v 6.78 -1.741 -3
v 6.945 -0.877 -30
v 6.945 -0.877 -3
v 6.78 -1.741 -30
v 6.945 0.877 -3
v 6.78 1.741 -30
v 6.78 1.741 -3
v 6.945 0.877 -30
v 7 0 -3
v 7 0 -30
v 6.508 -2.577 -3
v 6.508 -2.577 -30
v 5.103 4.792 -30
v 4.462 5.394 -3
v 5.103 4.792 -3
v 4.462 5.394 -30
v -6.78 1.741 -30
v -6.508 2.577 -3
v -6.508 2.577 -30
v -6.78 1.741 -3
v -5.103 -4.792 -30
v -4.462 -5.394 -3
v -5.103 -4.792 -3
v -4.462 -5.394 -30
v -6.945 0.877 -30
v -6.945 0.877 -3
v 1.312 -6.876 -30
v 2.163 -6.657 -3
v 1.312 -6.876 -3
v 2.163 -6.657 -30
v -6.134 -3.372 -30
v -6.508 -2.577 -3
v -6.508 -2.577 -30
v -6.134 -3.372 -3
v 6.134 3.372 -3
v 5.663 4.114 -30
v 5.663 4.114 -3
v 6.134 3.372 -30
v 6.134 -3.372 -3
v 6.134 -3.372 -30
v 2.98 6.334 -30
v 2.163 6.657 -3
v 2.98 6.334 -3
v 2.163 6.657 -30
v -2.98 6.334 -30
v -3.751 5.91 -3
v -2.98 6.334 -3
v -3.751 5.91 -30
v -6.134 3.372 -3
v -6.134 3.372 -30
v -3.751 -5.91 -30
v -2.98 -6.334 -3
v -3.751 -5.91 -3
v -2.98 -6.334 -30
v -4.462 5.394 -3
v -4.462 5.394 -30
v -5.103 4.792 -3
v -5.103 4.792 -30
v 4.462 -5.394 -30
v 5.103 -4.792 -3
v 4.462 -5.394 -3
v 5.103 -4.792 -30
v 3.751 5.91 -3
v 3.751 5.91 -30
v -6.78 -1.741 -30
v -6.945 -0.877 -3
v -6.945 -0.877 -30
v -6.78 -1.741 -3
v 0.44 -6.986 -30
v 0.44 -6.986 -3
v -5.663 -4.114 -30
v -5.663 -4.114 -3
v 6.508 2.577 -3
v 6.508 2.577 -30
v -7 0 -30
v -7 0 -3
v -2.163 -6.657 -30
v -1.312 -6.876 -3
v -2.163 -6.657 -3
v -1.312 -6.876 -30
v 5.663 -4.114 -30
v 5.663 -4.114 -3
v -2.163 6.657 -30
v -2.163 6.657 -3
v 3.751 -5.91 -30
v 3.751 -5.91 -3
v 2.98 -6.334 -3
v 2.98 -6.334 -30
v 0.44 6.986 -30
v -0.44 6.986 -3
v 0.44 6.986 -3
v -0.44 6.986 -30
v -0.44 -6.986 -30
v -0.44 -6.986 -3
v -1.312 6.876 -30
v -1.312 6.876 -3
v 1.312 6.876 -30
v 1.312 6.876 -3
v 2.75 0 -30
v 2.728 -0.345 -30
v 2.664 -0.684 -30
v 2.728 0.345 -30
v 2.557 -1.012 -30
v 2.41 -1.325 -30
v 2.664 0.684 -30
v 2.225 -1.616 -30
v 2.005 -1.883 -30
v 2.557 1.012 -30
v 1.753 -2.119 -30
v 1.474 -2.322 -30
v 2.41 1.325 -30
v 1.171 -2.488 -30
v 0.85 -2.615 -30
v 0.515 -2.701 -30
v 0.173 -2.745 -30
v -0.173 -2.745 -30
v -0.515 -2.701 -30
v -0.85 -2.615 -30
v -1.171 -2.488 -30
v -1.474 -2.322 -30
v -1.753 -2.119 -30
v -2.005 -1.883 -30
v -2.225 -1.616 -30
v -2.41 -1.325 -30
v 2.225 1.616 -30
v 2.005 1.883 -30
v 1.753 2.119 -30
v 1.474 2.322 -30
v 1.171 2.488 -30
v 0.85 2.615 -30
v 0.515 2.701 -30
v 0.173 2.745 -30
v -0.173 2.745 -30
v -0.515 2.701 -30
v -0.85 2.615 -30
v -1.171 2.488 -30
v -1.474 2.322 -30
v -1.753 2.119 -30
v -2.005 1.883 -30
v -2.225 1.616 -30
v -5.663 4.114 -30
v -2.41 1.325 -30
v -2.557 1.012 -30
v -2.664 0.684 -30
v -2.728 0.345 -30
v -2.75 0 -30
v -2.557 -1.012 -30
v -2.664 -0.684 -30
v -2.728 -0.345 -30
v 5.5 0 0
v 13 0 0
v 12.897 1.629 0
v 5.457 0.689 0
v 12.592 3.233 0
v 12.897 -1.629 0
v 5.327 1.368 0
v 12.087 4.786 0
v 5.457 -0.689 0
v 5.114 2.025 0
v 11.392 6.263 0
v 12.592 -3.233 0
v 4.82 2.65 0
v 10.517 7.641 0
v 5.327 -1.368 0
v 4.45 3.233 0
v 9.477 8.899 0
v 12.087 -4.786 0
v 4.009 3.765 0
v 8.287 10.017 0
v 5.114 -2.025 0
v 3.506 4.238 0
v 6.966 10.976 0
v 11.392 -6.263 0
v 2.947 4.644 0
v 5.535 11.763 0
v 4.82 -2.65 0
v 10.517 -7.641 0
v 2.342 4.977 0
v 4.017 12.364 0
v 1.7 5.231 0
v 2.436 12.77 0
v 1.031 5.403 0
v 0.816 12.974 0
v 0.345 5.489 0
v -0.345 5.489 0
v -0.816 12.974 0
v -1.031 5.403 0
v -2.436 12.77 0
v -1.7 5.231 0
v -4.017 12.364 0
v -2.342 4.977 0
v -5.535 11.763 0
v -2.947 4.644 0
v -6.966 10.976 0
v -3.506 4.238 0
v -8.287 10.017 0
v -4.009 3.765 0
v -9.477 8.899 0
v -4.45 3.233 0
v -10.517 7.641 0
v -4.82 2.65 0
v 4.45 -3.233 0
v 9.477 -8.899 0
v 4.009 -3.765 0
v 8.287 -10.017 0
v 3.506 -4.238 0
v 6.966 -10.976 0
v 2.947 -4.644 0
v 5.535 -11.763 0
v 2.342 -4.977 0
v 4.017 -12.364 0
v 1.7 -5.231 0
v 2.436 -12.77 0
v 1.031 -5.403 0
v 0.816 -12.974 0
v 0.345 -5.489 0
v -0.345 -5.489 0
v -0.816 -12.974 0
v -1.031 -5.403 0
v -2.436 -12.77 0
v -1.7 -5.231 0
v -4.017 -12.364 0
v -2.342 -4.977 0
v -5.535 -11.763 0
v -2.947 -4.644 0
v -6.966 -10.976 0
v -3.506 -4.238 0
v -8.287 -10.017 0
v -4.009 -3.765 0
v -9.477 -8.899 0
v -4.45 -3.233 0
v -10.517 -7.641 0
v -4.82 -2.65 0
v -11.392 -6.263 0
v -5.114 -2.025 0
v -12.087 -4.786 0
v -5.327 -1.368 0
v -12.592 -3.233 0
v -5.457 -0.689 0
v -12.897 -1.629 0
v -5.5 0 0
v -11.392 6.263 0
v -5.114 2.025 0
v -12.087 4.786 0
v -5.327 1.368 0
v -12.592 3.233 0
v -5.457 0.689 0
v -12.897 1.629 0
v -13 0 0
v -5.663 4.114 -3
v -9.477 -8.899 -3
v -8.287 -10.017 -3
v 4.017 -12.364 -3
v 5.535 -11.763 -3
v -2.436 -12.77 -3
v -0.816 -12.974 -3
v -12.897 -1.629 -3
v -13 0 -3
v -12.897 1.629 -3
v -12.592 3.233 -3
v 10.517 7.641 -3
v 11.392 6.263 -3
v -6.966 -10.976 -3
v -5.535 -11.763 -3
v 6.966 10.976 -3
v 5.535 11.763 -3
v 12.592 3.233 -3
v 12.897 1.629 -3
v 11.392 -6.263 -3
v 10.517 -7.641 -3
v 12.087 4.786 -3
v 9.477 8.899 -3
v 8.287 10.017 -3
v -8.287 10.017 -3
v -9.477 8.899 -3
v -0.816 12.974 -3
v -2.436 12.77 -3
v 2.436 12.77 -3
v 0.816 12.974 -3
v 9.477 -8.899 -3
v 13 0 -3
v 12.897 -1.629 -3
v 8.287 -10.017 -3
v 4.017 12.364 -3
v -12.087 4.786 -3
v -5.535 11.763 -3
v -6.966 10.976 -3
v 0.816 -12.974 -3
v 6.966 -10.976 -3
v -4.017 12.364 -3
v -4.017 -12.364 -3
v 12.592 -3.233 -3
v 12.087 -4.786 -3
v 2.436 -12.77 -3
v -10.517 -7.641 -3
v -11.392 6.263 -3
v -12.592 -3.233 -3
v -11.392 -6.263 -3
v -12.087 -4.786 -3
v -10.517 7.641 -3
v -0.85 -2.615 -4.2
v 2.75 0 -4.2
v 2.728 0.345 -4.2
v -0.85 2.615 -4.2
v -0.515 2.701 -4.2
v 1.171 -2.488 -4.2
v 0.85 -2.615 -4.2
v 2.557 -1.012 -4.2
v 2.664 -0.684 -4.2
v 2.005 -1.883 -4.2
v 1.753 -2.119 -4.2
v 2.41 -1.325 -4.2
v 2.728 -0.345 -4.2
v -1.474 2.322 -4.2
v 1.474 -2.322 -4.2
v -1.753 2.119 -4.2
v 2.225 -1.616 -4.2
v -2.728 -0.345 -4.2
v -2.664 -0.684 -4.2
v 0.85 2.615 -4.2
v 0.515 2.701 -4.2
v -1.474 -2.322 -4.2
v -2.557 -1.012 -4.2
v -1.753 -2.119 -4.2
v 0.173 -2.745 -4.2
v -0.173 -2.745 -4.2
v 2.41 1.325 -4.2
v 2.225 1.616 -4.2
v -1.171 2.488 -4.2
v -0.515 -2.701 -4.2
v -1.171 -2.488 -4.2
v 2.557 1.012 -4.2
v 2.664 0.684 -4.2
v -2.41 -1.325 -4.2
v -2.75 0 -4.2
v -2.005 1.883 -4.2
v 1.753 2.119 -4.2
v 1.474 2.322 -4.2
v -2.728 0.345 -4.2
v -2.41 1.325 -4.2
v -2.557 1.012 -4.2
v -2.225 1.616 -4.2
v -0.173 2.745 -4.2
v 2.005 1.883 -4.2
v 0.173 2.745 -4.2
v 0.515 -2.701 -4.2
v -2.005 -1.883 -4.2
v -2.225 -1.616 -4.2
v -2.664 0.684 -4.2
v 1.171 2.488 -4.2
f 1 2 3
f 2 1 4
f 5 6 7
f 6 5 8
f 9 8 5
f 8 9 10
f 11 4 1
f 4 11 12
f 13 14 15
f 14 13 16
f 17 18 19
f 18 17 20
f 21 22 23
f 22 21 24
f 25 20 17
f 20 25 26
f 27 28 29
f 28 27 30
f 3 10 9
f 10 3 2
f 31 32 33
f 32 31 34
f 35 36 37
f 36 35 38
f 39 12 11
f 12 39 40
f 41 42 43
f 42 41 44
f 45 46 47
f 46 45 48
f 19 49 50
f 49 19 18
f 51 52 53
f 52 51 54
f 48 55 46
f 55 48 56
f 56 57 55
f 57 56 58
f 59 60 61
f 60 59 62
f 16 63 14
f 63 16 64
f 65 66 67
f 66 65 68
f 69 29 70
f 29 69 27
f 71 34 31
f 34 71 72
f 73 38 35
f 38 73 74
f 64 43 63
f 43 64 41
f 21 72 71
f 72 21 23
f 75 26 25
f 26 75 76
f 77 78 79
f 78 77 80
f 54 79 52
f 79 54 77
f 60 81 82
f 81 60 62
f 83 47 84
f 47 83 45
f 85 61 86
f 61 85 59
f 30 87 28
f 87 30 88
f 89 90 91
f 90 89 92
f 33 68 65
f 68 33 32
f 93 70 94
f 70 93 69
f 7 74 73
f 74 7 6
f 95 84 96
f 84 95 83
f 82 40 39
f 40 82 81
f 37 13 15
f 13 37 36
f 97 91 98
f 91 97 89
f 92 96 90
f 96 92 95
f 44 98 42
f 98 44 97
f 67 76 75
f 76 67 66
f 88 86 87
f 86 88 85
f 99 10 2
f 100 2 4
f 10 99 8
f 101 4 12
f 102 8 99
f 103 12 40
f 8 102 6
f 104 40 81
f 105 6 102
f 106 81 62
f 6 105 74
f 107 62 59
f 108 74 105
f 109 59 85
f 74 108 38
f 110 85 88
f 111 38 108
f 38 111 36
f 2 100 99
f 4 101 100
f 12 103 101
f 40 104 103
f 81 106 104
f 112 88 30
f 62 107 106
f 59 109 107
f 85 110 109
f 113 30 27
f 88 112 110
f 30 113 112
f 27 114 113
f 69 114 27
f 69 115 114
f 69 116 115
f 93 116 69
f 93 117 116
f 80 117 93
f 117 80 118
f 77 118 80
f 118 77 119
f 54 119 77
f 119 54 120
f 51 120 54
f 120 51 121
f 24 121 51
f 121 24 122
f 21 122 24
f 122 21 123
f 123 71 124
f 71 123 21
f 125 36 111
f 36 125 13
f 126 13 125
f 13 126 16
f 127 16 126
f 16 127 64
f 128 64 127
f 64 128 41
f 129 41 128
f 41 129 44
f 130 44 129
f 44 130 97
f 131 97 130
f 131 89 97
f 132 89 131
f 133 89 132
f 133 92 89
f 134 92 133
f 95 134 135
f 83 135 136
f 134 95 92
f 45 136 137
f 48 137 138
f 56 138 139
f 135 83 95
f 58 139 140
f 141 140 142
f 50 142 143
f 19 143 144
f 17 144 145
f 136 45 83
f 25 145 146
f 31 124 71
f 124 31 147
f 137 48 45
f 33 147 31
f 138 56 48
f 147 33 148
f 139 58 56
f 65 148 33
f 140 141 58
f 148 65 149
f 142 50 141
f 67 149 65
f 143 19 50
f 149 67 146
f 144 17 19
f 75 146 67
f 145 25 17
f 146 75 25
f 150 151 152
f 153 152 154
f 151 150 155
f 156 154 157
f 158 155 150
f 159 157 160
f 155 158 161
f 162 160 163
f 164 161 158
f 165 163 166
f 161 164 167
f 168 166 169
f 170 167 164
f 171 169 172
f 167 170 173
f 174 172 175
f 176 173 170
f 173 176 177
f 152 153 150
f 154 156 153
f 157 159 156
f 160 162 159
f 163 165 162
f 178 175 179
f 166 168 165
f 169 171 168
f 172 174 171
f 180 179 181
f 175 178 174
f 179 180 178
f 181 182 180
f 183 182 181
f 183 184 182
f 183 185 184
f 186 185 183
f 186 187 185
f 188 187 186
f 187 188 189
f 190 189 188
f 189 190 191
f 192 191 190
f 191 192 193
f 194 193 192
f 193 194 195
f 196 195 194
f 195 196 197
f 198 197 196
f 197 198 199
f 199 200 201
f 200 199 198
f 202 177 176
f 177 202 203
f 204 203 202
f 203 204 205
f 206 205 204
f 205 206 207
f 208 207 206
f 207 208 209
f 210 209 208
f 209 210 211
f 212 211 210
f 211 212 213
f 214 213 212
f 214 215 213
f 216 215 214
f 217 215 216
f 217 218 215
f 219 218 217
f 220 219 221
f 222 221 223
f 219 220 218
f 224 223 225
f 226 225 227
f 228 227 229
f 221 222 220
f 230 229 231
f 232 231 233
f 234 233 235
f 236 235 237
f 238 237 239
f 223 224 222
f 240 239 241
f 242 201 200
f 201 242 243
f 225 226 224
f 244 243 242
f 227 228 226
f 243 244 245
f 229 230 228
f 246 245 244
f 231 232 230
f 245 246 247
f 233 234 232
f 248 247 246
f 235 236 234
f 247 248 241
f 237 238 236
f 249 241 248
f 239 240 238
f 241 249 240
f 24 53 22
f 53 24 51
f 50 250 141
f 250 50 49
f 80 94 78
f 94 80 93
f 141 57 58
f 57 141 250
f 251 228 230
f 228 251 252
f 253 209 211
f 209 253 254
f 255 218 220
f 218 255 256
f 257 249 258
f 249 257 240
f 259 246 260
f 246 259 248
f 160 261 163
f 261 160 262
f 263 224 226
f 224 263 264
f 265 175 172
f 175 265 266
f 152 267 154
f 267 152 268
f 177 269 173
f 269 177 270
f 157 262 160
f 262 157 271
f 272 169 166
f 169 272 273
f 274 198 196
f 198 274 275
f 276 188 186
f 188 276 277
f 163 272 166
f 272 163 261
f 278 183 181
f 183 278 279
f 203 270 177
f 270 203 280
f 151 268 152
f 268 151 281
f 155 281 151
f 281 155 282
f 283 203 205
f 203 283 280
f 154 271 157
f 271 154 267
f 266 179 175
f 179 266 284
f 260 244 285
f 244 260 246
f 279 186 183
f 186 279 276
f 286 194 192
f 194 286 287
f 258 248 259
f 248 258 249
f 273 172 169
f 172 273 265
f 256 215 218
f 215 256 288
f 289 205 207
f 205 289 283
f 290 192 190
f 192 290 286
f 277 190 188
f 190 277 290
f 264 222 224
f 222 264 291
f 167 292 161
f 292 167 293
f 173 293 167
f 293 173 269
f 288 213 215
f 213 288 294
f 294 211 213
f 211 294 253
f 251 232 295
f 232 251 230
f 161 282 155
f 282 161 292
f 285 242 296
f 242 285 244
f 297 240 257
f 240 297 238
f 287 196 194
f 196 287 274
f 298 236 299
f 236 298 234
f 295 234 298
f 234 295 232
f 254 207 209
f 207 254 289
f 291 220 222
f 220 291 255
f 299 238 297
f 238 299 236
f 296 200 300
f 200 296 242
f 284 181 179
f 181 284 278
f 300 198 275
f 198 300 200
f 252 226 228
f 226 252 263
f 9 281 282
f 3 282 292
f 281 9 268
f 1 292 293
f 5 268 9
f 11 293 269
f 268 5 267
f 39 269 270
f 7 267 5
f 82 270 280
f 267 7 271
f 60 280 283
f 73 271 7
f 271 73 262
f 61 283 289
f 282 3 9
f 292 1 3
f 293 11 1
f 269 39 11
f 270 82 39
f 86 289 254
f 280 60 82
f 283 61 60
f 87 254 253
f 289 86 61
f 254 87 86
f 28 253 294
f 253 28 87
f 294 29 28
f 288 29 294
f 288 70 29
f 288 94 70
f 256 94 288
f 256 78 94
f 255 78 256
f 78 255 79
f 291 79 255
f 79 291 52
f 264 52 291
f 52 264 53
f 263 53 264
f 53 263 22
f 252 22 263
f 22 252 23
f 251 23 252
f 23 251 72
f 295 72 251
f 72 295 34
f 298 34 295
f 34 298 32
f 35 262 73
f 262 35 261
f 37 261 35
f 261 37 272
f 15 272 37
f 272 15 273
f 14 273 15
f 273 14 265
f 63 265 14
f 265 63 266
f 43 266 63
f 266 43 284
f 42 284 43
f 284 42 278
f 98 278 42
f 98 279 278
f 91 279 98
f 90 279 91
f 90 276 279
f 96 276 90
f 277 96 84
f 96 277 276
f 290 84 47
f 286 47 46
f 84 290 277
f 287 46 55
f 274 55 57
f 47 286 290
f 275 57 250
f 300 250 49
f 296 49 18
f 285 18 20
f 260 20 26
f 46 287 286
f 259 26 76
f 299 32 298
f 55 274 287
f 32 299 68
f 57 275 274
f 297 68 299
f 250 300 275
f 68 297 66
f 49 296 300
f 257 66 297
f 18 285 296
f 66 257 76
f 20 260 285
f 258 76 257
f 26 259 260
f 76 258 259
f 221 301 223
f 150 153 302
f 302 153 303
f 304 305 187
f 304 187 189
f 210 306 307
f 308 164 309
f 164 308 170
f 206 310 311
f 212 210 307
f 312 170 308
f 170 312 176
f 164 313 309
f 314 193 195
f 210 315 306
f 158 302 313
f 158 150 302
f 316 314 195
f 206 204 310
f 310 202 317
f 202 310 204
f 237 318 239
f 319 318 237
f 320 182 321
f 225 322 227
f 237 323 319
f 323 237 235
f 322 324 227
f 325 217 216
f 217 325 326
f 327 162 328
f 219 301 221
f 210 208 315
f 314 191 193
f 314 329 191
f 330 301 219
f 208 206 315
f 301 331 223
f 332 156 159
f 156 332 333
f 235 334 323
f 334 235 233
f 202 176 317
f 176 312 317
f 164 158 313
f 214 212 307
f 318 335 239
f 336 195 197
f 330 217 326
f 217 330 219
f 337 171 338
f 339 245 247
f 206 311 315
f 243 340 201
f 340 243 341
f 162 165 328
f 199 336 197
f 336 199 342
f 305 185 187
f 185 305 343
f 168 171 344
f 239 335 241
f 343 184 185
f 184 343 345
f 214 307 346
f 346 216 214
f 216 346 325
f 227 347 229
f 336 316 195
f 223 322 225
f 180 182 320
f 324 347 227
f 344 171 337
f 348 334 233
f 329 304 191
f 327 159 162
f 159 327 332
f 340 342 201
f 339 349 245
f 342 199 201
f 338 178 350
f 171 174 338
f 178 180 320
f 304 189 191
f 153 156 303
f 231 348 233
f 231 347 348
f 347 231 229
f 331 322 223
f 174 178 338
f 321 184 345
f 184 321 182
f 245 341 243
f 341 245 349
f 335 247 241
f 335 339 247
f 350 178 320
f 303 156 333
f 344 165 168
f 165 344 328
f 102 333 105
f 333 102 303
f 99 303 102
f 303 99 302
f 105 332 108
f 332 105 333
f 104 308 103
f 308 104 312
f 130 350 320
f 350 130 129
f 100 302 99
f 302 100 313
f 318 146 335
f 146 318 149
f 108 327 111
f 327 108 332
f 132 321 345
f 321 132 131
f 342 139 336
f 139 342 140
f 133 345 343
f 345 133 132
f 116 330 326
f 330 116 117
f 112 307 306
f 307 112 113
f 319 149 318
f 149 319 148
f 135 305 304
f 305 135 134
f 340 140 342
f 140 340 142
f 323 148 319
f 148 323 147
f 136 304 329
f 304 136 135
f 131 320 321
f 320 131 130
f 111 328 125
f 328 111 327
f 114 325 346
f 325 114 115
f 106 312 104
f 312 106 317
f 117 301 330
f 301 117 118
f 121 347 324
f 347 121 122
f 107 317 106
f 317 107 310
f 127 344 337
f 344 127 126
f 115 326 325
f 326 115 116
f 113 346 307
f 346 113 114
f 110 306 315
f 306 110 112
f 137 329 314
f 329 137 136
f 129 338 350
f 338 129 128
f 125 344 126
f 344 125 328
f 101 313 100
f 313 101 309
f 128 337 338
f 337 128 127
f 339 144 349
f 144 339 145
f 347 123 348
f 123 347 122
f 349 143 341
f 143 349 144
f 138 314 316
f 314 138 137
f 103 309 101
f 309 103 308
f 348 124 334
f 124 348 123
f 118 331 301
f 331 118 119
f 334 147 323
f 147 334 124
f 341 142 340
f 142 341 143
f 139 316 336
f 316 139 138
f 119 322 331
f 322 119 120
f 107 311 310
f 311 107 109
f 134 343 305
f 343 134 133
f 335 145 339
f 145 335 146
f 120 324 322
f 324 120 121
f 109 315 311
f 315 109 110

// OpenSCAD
$fn = 50;


difference() {
	union() {
		translate(v = [0, 0, -30.0000000000]) {
			cylinder(h = 30, r = 7.0000000000);
		}
		translate(v = [0, 0, -3.0000000000]) {
			cylinder(h = 3, r = 13.0000000000);
		}
	}
	union() {
		translate(v = [0, 0, 0]) {
			rotate(a = [0, 0, 0]) {
				difference() {
					union() {
						#translate(v = [0, 0, -30.0000000000]) {
							cylinder(h = 30, r = 2.2500000000);
						}
						#translate(v = [0, 0, -4.2000000000]) {
							cylinder(h = 4.2000000000, r1 = 2.7500000000, r2 = 5.5000000000);
						}
						#translate(v = [0, 0, -30.0000000000]) {
							cylinder(h = 30, r = 2.7500000000);
						}
						#translate(v = [0, 0, -30.0000000000]) {
							cylinder(h = 30, r = 2.2500000000);
						}
					}
					union();
				}
			}
		}
	}
}
